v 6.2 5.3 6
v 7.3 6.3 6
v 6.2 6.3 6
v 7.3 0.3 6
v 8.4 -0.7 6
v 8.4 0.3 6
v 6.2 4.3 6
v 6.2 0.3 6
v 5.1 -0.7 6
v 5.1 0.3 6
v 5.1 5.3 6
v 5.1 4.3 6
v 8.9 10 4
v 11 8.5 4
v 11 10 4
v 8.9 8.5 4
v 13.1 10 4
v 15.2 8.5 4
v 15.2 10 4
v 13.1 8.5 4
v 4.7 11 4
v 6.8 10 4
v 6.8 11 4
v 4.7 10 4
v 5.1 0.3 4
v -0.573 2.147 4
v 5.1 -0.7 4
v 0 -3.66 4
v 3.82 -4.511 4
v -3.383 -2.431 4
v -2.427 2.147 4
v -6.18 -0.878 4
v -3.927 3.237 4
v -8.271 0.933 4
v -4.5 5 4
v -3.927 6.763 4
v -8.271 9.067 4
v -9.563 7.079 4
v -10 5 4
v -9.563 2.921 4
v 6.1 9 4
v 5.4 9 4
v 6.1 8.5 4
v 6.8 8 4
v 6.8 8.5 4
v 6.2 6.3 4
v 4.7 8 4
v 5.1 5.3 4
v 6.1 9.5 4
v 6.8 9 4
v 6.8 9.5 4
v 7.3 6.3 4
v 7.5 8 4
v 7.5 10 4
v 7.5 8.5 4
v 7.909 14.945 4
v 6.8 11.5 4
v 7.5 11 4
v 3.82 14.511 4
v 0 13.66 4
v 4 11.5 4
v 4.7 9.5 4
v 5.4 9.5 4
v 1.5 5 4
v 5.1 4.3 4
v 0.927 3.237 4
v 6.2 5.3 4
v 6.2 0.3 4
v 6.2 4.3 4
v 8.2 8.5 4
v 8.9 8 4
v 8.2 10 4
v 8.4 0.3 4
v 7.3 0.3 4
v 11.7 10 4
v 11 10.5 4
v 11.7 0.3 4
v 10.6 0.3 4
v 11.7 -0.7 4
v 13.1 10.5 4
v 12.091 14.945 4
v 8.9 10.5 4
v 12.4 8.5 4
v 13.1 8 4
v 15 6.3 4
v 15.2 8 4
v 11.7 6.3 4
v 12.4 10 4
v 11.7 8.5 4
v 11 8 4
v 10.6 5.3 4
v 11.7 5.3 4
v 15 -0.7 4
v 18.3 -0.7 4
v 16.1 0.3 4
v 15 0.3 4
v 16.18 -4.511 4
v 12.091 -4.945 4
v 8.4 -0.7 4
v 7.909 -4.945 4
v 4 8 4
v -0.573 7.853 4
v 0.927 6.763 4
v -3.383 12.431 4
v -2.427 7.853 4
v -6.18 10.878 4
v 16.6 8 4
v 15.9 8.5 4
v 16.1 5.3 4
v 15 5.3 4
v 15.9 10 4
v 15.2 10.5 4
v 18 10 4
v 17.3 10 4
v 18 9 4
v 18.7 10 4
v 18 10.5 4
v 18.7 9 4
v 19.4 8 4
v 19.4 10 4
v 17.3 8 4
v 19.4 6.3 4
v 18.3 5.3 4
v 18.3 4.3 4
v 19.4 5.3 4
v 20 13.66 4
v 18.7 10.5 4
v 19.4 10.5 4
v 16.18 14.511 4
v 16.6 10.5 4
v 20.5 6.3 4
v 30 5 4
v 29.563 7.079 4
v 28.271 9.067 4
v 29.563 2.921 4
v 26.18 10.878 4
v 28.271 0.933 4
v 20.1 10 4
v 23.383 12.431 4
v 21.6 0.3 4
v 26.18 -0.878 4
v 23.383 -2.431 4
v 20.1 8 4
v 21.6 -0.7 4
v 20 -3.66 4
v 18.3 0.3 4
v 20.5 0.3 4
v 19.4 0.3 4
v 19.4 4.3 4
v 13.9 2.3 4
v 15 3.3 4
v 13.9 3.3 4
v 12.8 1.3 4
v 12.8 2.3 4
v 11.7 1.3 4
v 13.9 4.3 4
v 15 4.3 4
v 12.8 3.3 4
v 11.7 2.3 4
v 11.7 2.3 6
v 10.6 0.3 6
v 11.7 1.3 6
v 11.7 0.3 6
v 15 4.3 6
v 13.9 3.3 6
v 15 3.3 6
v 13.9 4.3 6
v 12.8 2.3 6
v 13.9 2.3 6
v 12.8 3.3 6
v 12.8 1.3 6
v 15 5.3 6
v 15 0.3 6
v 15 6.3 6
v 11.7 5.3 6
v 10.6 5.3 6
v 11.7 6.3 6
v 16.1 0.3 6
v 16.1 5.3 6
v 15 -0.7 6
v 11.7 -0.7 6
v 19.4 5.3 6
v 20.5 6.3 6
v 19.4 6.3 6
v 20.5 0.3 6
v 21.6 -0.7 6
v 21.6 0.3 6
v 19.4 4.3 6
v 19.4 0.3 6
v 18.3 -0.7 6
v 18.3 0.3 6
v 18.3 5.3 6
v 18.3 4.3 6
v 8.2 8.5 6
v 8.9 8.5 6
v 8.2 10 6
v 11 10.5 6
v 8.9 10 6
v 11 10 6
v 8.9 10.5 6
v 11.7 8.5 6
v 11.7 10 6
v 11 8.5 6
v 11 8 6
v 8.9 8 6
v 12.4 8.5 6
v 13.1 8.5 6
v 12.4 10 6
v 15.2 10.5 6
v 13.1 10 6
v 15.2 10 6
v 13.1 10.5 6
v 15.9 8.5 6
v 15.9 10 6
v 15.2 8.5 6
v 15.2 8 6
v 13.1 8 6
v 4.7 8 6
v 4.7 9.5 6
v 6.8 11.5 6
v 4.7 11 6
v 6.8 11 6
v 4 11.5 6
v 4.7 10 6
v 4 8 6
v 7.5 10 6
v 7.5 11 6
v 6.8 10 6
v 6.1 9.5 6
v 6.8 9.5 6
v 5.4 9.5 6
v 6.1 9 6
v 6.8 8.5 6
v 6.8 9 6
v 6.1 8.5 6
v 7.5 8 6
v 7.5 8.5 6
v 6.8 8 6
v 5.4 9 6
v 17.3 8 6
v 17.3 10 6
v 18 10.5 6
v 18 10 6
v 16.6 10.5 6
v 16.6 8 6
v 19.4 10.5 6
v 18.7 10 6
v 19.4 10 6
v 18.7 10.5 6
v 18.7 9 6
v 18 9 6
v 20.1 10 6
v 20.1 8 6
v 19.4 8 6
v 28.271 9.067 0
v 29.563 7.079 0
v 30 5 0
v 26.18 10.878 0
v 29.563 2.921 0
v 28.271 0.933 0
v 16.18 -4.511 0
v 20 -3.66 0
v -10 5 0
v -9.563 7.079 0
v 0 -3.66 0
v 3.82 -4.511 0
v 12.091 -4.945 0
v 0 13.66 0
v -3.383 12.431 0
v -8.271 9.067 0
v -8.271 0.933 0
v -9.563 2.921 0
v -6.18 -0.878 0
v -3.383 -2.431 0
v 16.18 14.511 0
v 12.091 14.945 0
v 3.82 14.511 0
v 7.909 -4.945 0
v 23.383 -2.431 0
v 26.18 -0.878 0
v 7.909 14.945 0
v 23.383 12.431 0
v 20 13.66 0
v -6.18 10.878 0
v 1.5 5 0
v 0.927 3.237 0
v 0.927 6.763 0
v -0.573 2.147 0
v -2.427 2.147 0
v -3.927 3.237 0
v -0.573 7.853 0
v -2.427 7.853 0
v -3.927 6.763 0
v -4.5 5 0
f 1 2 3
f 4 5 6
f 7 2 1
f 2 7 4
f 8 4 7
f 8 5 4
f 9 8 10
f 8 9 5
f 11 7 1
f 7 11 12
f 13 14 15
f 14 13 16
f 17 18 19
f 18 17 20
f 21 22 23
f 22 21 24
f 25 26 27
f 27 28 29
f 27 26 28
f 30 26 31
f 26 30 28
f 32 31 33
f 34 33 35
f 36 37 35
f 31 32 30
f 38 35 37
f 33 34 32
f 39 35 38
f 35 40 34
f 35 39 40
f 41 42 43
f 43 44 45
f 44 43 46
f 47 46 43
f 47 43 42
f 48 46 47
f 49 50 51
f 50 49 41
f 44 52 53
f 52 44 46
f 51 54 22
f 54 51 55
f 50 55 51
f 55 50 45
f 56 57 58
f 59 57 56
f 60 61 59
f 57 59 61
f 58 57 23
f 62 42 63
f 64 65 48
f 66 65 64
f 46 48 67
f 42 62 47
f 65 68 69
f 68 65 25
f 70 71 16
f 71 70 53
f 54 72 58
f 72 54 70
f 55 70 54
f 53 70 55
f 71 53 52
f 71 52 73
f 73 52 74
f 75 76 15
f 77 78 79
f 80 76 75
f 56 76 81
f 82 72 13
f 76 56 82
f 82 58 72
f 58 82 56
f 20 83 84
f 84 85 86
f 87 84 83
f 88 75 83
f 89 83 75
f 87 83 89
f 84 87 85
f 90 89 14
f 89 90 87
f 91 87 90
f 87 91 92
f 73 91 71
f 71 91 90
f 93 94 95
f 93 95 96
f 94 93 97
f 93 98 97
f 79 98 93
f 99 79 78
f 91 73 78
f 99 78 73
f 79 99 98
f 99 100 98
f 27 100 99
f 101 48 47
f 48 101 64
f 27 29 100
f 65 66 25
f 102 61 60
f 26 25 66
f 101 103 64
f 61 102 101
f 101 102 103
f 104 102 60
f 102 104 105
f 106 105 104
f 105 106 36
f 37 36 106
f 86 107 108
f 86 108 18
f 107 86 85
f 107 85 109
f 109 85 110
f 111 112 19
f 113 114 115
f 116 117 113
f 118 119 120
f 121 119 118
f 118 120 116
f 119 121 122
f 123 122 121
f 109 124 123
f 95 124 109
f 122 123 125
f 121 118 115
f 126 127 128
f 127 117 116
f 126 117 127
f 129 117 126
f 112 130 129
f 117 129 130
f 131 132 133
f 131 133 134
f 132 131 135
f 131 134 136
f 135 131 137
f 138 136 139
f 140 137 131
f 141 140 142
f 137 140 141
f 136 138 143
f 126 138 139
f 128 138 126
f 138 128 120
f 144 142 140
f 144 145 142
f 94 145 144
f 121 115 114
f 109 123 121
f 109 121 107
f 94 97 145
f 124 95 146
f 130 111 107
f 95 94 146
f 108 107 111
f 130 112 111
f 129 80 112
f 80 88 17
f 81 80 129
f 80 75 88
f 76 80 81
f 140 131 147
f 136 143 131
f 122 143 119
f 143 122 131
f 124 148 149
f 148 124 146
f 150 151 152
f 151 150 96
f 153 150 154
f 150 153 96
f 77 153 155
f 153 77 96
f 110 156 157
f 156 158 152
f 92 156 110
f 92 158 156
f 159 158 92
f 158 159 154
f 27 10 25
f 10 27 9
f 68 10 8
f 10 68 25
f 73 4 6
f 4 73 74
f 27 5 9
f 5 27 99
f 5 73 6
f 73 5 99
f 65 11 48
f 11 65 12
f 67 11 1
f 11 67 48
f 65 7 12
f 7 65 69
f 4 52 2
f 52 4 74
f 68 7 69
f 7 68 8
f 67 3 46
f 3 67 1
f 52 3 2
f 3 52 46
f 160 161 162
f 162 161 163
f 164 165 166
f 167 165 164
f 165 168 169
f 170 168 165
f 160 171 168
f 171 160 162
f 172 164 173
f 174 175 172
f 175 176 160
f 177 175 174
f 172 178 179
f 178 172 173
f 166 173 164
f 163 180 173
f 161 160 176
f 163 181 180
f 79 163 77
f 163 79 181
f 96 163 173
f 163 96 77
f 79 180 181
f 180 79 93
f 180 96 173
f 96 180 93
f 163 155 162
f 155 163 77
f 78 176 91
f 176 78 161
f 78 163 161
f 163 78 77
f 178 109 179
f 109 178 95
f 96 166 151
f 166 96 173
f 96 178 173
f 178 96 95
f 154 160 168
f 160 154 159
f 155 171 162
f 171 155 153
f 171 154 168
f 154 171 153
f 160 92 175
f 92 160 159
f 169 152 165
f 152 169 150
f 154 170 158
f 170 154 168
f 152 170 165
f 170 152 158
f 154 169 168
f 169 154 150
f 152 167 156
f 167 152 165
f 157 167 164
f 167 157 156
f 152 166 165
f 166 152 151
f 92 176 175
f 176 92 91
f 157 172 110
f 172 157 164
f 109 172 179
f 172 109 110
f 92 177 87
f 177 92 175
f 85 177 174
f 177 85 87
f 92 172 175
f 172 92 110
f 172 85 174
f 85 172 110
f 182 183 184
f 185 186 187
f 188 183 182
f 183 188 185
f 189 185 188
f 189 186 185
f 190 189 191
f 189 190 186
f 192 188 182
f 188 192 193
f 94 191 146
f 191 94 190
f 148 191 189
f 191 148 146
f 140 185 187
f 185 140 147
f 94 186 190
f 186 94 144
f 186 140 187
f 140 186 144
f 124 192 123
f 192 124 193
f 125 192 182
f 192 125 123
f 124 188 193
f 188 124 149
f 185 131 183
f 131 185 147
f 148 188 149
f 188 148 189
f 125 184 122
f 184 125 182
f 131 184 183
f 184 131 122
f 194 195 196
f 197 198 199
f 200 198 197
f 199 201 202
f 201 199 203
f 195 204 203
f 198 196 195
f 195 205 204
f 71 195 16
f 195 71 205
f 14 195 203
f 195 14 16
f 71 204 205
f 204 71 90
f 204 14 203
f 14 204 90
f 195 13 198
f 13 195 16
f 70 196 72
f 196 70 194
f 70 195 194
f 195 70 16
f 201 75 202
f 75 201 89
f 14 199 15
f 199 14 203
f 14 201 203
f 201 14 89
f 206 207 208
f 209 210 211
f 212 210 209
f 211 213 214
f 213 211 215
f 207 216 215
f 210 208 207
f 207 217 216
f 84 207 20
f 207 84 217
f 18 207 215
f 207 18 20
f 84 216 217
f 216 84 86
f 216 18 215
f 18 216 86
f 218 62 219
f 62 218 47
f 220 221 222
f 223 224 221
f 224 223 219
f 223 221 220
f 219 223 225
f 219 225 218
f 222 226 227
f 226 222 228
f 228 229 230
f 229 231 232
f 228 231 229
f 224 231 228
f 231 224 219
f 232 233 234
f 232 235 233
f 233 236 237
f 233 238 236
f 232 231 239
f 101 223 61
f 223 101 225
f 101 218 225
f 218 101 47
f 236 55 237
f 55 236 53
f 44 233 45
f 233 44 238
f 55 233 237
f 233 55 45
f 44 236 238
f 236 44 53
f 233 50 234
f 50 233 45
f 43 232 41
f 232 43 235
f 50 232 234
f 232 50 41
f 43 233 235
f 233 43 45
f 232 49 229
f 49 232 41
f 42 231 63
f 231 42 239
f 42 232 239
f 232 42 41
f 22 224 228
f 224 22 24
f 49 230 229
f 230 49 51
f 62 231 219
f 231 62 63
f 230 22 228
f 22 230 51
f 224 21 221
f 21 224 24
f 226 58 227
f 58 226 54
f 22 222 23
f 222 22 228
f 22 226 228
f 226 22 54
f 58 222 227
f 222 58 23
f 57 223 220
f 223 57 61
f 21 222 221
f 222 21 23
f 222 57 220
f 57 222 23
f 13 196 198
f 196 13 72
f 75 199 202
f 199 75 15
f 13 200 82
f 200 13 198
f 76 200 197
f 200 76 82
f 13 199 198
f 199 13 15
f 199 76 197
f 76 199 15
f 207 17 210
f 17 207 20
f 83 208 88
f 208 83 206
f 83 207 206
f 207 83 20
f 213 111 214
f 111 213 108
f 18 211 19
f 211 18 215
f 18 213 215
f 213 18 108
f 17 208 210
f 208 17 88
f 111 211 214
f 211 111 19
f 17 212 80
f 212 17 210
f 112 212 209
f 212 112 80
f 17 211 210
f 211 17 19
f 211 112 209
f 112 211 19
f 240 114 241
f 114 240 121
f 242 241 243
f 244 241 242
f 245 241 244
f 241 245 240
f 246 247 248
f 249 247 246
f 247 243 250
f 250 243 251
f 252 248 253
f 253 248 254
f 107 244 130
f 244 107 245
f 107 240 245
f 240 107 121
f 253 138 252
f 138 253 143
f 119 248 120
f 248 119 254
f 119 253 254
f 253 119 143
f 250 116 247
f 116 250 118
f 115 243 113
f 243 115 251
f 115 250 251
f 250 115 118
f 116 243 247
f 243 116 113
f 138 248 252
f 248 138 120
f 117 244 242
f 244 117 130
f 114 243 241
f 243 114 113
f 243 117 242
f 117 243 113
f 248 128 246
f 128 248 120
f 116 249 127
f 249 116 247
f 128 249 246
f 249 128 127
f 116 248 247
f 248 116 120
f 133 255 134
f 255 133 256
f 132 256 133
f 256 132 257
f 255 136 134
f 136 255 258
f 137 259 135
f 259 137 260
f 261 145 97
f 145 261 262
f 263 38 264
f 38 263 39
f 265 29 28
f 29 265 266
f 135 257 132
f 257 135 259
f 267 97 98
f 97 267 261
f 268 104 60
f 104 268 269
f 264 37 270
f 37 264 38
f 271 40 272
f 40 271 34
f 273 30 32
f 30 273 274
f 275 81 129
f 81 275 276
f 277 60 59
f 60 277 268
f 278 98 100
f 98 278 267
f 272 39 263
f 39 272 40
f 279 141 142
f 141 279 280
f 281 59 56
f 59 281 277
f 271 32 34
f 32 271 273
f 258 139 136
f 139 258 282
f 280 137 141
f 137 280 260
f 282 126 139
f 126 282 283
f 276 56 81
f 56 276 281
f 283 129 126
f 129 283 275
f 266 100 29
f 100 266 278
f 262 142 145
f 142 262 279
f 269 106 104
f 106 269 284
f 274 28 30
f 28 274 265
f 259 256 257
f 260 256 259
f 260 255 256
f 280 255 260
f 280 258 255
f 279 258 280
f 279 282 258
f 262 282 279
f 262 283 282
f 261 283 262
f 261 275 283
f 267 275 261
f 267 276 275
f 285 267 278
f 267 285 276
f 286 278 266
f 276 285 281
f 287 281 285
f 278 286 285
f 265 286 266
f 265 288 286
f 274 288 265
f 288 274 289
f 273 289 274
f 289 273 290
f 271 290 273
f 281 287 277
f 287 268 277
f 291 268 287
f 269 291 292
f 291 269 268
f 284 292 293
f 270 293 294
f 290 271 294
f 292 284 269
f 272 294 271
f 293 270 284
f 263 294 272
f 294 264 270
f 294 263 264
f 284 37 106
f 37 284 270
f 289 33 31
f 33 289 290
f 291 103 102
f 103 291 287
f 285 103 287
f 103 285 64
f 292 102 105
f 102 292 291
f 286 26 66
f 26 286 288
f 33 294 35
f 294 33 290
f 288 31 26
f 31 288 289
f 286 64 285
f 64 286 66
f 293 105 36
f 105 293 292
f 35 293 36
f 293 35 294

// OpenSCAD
//#
//#  thing1379622_roomnumber-keychain-customizable.scad
//#  http://www.thingiverse.com/thing:1379622
//#
//#  2016-02-29  V0.1 prototype
//#  2016-02-29  V0.2 dynamic scale, inner font

//###  parameter  ###

room_text = "Room";
room_number = "101";
keychain_height = 6; // [2:3:18]
keychain_size = 1.0; // [0.5:Small,1.0:Medium,1.5:Large]
font_style = "outer"; // [outer,inner]

//###  parts  ###

scale(keychain_size) print_part();

module print_part() {
  text_scale = 4/len(room_text);
  number_scale = 3/len(room_number);
  if (font_style == "inner") {
      difference() {
          scale([2,1,1]) 
            translate([10/2,10/2,0])
            cylinder(keychain_height,10,10);
          union () {
              color("red") 
                translate([4.0,-0.7,keychain_height/3*2])
                scale([1.1*number_scale,1.0,keychain_height/3*1]) 
                lib_drawtext(room_number);
              color("red") 
                translate([4.0,8,keychain_height/3*2])
                scale([0.7*text_scale,0.5,keychain_height/3*1]) 
                lib_drawtext(room_text);
              color("green") 
                translate([-3/2,5,0])
                cylinder(keychain_height,3,3);
          }
      }
  } else {
      difference() {
          union () {
              scale([2,1,1]) 
                translate([10/2,10/2,0])
                cylinder(keychain_height/3*2,10,10);
              color("red") 
                translate([4.0,-0.7,keychain_height/3*2])
                scale([1.1*number_scale,1.0,keychain_height/3*1]) 
                lib_drawtext(room_number);
              color("red") 
                translate([4.0,8,keychain_height/3*2])
                scale([0.7*text_scale,0.5,keychain_height/3*1]) 
                lib_drawtext(room_text);
          }  
          color("green") 
            translate([-3/2,5,0])
            cylinder(keychain_height/3*2,3,3);
      }
  }
}

//###  libraries  ###

module lib_drawtext(text) {

  // 
  //  OpenSCAD 3D Text Generator
  //  http://www.thingiverse.com/thing:59817
  // 
  //  Copyright (c) by pgreenland, published  Mar 10, 2013
  //  Licensed under the Creative Commons - Attribution - Share Alike license. 
  // 

  //Characters
  chars = " !\"#$%&'()*+,-./0123456789:;<=>?@ABCDEFGHIJKLMNOPQRSTUVWXYZ[\\]^_`abcdefghijklmnopqrstuvwxyz{|}";

  //Chracter table defining 5x7 characters
  //Adapted from: http://www.geocities.com/dinceraydin/djlcdsim/chartable.js
  char_table = [ [ 0, 0, 0, 0, 0, 0, 0],
                 [ 4, 0, 4, 4, 4, 4, 4],
                 [ 0, 0, 0, 0,10,10,10],
                 [10,10,31,10,31,10,10],
                 [ 4,30, 5,14,20,15, 4],
                 [ 3,19, 8, 4, 2,25,24],
                 [13,18,21, 8,20,18,12],
                 [ 0, 0, 0, 0, 8, 4,12],
                 [ 2, 4, 8, 8, 8, 4, 2],
                 [ 8, 4, 2, 2, 2, 4, 8],
                 [ 0, 4,21,14,21, 4, 0],
                 [ 0, 4, 4,31, 4, 4, 0],
                 [ 8, 4,12, 0, 0, 0, 0],
                 [ 0, 0, 0,31, 0, 0, 0],
                 [12,12, 0, 0, 0, 0, 0],
                 [ 0,16, 8, 4, 2, 1, 0],
                 [14,17,25,21,19,17,14],
                 [14, 4, 4, 4, 4,12, 4],
                 [31, 8, 4, 2, 1,17,14],
                 [14,17, 1, 2, 4, 2,31],
                 [ 2, 2,31,18,10, 6, 2],
                 [14,17, 1, 1,30,16,31],
                 [14,17,17,30,16, 8, 6],
                 [ 8, 8, 8, 4, 2, 1,31],
                 [14,17,17,14,17,17,14],
                 [12, 2, 1,15,17,17,14],
                 [ 0,12,12, 0,12,12, 0],
                 [ 8, 4,12, 0,12,12, 0],
                 [ 2, 4, 8,16, 8, 4, 2],
                 [ 0, 0,31, 0,31, 0, 0],
                 [16, 8, 4, 2, 4, 8,16],
                 [ 4, 0, 4, 2, 1,17,14],
                 [14,21,21,13, 1,17,14],
                 [17,17,31,17,17,17,14],
                 [30,17,17,30,17,17,30],
                 [14,17,16,16,16,17,14],
                 [30,17,17,17,17,17,30],
                 [31,16,16,30,16,16,31],
                 [16,16,16,30,16,16,31],
                 [15,17,17,23,16,17,14],
                 [17,17,17,31,17,17,17],
                 [14, 4, 4, 4, 4, 4,14],
                 [12,18, 2, 2, 2, 2, 7],
                 [17,18,20,24,20,18,17],
                 [31,16,16,16,16,16,16],
                 [17,17,17,21,21,27,17],
                 [17,17,19,21,25,17,17],
                 [14,17,17,17,17,17,14],
                 [16,16,16,30,17,17,30],
                 [13,18,21,17,17,17,14],
                 [17,18,20,30,17,17,30],
                 [30, 1, 1,14,16,16,15],
                 [ 4, 4, 4, 4, 4, 4,31],
                 [14,17,17,17,17,17,17],
                 [ 4,10,17,17,17,17,17],
                 [10,21,21,21,17,17,17],
                 [17,17,10, 4,10,17,17],
                 [ 4, 4, 4,10,17,17,17],
                 [31,16, 8, 4, 2, 1,31],
                 [14, 8, 8, 8, 8, 8,14],
                 [ 0, 1, 2, 4, 8,16, 0],
                 [14, 2, 2, 2, 2, 2,14],
                 [ 0, 0, 0, 0,17,10, 4],
                 [31, 0, 0, 0, 0, 0, 0],
                 [ 0, 0, 0, 0, 2, 4, 8],
                 [15,17,15, 1,14, 0, 0],
                 [30,17,17,25,22,16,16],
                 [14,17,16,16,14, 0, 0],
                 [15,17,17,19,13, 1, 1],
                 [14,16,31,17,14, 0, 0],
                 [ 8, 8, 8,28, 8, 9, 6],
                 [14, 1,15,17,15, 0, 0],
                 [17,17,17,25,22,16,16],
                 [14, 4, 4, 4,12, 0, 4],
                 [12,18, 2, 2, 2, 6, 2],
                 [18,20,24,20,18,16,16],
                 [14, 4, 4, 4, 4, 4,12],
                 [17,17,21,21,26, 0, 0],
                 [17,17,17,25,22, 0, 0],
                 [14,17,17,17,14, 0, 0],
                 [16,16,30,17,30, 0, 0],
                 [ 1, 1,15,19,13, 0, 0],
                 [16,16,16,25,22, 0, 0],
                 [30, 1,14,16,15, 0, 0],
                 [ 6, 9, 8, 8,28, 8, 8],
                 [13,19,17,17,17, 0, 0],
                 [ 4,10,17,17,17, 0, 0],
                 [10,21,21,17,17, 0, 0],
                 [17,10, 4,10,17, 0, 0],
                 [14, 1,15,17,17, 0, 0],
                 [31, 8, 4, 2,31, 0, 0],
                 [ 2, 4, 4, 8, 4, 4, 2],
                 [ 4, 4, 4, 4, 4, 4, 4],
                 [ 8, 4, 4, 2, 4, 4, 8] ];

  //Binary decode table
  dec_table = [ "00000", "00001", "00010", "00011", "00100", "00101",
                "00110", "00111", "01000", "01001", "01010", "01011",
                "01100", "01101", "01110", "01111", "10000", "10001",
                "10010", "10011", "10100", "10101", "10110", "10111",
                "11000", "11001", "11010", "11011", "11100", "11101",
                "11110", "11111" ];

  //Process string one character at a time
  for(itext = [0:len(text)-1]) {
    //Convert character to index
    ichar = search(text[itext],chars,1)[0];

    //Decode character - rows
    for(irow = [0:6]) {
      //Select value to draw from table
      val = dec_table[char_table[ichar][irow]];

      //Decode character - cols
      for(icol = [0:4]) {
        // Retrieve bit to draw
        bit = search(val[icol],"01",1)[0];

        if(bit) {
            //Output cube
            translate([icol + (6*itext), irow, 0])
                cube([1.0001,1.0001,1]);
        }
      }
    }
  }
}
